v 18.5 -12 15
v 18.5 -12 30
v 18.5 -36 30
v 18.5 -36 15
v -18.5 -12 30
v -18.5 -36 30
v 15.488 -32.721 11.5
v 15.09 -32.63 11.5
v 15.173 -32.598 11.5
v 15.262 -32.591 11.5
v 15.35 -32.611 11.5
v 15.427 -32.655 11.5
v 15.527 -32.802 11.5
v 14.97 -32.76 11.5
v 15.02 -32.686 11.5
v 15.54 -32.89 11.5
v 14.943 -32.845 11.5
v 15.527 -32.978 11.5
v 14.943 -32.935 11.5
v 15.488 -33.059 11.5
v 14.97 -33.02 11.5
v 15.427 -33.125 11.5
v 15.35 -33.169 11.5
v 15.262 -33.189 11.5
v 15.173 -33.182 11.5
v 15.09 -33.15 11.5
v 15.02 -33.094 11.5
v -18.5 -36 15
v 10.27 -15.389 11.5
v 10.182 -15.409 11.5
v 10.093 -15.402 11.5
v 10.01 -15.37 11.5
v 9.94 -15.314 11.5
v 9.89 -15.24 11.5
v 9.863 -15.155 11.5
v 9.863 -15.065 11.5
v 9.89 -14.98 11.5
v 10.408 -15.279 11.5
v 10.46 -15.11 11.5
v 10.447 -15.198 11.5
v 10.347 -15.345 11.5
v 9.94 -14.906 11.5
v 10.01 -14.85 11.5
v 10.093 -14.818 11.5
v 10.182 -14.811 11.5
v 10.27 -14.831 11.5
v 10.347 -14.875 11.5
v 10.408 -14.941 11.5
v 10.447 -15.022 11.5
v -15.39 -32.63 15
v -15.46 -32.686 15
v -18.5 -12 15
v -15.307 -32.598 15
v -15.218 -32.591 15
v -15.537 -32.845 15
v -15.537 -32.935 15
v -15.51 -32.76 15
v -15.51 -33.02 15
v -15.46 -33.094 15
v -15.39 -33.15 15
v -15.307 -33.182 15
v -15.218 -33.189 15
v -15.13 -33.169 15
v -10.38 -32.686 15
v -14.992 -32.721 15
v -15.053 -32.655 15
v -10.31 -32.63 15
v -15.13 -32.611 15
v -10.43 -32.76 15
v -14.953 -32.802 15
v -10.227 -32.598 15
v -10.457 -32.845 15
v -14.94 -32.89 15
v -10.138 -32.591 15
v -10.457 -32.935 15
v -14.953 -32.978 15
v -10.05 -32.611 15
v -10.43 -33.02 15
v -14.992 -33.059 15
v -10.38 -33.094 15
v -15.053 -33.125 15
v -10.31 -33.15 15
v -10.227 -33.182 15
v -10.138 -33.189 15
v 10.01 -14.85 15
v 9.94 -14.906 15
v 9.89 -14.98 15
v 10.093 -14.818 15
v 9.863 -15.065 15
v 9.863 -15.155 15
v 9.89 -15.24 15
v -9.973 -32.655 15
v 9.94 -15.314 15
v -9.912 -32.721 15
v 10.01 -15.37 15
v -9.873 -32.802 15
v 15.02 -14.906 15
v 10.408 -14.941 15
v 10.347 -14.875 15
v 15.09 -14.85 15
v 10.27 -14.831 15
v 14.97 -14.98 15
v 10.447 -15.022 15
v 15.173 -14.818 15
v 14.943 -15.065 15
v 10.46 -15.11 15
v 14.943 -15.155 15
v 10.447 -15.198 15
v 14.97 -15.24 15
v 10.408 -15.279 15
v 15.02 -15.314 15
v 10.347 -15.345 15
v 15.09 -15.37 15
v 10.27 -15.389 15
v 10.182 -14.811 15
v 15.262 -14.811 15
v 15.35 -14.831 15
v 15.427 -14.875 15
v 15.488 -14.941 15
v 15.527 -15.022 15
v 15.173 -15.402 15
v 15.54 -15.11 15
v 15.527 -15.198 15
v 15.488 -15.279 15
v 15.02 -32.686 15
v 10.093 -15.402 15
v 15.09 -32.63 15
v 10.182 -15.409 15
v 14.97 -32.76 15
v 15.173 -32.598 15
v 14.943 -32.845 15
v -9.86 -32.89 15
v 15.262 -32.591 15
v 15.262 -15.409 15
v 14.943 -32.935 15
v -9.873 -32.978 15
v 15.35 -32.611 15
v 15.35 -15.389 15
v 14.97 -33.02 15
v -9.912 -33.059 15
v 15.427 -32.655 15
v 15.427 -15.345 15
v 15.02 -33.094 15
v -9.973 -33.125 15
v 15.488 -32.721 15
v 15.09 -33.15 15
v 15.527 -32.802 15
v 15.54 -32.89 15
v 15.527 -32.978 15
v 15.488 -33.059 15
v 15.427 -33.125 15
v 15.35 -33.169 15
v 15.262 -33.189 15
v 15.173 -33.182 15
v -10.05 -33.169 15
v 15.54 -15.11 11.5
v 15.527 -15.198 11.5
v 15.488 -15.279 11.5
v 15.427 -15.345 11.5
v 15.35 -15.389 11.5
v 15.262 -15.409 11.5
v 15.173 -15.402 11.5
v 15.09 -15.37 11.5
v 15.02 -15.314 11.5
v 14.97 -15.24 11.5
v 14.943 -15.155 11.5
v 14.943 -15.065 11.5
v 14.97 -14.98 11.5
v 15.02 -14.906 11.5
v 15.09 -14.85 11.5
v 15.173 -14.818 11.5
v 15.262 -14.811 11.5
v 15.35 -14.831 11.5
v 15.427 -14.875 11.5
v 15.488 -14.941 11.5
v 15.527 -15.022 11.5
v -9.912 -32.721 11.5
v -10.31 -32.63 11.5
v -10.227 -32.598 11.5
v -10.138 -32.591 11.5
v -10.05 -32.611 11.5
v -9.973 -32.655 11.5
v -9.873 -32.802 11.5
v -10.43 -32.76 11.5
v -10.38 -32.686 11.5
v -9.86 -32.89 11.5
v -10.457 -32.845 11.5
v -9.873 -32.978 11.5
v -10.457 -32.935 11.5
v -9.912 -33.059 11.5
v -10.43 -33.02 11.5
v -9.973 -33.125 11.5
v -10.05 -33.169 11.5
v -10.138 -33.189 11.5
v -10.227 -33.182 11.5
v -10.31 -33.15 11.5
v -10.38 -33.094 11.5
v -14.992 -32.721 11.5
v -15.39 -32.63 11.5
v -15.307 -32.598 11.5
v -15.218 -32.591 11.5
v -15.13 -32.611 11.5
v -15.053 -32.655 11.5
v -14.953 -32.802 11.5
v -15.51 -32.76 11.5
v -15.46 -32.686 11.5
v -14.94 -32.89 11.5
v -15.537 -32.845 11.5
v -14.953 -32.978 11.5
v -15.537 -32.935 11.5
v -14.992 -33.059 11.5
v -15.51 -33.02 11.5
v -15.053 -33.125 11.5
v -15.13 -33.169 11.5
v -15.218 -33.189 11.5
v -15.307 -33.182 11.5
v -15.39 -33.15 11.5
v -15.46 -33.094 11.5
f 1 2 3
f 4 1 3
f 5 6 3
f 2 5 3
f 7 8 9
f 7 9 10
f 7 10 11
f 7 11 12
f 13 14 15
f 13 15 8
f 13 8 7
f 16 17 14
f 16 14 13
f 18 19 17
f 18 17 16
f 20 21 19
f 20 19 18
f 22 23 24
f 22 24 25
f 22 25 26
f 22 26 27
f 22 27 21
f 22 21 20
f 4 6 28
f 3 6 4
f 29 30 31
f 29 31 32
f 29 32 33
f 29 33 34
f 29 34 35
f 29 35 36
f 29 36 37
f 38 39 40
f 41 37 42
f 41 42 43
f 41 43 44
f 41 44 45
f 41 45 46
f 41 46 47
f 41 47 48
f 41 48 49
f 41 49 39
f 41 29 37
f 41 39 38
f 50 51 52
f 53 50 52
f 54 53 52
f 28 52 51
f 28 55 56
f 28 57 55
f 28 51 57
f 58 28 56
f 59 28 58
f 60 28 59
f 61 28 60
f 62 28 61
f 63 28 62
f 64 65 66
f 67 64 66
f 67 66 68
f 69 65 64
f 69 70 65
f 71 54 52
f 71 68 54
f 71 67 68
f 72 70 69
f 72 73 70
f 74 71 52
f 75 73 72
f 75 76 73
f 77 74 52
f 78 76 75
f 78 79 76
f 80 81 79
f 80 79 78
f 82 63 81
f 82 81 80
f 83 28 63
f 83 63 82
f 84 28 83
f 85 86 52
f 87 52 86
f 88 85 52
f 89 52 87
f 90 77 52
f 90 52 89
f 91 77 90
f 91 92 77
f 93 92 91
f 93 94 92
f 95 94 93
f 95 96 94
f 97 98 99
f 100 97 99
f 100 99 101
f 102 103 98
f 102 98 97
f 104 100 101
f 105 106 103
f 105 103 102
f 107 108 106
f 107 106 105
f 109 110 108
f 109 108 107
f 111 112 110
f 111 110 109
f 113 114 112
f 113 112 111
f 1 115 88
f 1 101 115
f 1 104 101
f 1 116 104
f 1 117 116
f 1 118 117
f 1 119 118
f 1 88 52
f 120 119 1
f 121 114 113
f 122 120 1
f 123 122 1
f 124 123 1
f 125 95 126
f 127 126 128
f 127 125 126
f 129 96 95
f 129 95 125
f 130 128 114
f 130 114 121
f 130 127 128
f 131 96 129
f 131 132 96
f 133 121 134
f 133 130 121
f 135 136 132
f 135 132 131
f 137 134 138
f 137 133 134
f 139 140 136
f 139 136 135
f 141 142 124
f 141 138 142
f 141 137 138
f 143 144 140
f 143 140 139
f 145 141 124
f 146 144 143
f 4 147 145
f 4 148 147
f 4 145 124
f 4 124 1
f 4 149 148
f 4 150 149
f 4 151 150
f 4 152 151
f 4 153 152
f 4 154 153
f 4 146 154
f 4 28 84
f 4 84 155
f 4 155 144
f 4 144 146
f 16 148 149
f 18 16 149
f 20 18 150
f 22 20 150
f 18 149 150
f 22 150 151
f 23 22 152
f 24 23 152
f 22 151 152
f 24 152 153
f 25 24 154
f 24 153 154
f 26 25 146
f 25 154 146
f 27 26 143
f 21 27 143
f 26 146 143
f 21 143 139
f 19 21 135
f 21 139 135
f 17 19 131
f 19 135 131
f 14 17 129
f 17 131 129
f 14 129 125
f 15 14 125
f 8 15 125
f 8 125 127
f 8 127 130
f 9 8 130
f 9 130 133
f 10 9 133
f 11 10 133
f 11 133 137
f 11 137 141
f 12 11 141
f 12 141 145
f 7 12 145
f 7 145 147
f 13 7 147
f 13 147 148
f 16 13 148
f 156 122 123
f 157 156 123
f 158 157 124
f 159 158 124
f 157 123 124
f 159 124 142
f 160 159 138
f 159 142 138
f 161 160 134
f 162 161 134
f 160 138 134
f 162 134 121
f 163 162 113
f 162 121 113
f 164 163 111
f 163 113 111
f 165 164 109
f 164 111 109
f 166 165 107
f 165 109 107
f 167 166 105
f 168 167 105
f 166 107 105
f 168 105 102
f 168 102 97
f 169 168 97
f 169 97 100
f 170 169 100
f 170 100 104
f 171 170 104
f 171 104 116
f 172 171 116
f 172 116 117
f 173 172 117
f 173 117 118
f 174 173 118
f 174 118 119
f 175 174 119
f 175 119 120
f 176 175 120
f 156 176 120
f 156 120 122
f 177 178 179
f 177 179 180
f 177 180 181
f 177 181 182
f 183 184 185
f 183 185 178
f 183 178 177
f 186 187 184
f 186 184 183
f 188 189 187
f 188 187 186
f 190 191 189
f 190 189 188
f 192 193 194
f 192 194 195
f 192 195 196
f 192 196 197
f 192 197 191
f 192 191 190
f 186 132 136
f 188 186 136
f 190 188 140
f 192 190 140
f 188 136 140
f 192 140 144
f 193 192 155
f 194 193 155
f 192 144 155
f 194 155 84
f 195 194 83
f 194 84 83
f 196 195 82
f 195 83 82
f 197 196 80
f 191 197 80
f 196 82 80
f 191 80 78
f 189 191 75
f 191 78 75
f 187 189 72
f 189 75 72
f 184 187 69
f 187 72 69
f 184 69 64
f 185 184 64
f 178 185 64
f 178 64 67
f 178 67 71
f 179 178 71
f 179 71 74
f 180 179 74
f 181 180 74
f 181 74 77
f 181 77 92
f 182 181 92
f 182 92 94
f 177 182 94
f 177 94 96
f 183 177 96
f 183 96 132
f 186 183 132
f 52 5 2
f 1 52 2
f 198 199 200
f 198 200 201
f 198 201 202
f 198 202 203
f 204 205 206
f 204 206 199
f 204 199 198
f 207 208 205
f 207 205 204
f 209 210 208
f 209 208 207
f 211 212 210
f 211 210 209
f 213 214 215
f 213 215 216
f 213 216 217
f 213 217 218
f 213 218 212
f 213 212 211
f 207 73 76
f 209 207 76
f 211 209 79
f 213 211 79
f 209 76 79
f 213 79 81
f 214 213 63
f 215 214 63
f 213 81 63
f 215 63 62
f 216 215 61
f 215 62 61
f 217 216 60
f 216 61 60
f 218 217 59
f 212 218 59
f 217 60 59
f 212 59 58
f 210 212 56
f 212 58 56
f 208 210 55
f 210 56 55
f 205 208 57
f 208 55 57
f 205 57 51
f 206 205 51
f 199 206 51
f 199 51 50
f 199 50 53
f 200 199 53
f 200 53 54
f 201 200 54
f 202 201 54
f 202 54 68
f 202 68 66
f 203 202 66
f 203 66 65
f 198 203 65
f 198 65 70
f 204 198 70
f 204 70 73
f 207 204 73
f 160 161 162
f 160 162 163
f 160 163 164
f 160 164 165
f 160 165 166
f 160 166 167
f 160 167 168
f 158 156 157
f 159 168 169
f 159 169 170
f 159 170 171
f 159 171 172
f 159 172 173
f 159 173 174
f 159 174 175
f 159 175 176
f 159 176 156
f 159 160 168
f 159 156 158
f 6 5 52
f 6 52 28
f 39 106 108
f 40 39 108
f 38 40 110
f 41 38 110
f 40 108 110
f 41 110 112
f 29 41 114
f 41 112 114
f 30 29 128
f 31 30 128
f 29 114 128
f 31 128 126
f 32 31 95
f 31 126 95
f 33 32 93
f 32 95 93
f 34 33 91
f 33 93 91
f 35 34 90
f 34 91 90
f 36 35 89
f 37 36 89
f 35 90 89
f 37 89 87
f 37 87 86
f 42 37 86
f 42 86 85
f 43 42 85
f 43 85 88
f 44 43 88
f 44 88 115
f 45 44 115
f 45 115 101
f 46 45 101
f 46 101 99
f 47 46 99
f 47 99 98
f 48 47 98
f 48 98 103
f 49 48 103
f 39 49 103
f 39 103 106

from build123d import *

# Parameters (mm, degrees)
F0_W     = 37
F0_H     = 24
F0_R     = 0.3
F1_DEPTH = 15
F2_DEPTH = 18.5
F3_ANGLE = 180


with BuildPart() as f1:
    # F0 (on Top) → F1 (new body)
    with BuildSketch(Plane.XY):
        Rectangle(F0_W, F0_H)
        with Locations((10.16, -8.89)):
            Circle(F0_R, mode=Mode.SUBTRACT)
        with Locations((15.24, -8.89)):
            Circle(F0_R, mode=Mode.SUBTRACT)
        with Locations((-15.24, 8.89)):
            Circle(F0_R, mode=Mode.SUBTRACT)
        with Locations((-10.16, 8.89)):
            Circle(F0_R, mode=Mode.SUBTRACT)
        with Locations((15.24, 8.89)):
            Circle(F0_R, mode=Mode.SUBTRACT)
    extrude(amount=F1_DEPTH)

    # F0 (on Top) → F2 (join)
    with BuildSketch(Plane.XY):
        with Locations((15.24, 8.89)):
            Circle(F0_R)
        with Locations((-10.16, 8.89)):
            Circle(F0_R)
        with Locations((-15.24, 8.89)):
            Circle(F0_R)
        with Locations((15.24, -8.89)):
            Circle(F0_R)
        with Locations((10.16, -8.89)):
            Circle(F0_R)
    extrude(amount=F2_DEPTH)


with BuildPart() as f1_1:
    # F3: moved
    add(f1.part.rotate(Axis((0, -12, 15), (1, 0, 0)), F3_ANGLE))


solid = f1_1.part
